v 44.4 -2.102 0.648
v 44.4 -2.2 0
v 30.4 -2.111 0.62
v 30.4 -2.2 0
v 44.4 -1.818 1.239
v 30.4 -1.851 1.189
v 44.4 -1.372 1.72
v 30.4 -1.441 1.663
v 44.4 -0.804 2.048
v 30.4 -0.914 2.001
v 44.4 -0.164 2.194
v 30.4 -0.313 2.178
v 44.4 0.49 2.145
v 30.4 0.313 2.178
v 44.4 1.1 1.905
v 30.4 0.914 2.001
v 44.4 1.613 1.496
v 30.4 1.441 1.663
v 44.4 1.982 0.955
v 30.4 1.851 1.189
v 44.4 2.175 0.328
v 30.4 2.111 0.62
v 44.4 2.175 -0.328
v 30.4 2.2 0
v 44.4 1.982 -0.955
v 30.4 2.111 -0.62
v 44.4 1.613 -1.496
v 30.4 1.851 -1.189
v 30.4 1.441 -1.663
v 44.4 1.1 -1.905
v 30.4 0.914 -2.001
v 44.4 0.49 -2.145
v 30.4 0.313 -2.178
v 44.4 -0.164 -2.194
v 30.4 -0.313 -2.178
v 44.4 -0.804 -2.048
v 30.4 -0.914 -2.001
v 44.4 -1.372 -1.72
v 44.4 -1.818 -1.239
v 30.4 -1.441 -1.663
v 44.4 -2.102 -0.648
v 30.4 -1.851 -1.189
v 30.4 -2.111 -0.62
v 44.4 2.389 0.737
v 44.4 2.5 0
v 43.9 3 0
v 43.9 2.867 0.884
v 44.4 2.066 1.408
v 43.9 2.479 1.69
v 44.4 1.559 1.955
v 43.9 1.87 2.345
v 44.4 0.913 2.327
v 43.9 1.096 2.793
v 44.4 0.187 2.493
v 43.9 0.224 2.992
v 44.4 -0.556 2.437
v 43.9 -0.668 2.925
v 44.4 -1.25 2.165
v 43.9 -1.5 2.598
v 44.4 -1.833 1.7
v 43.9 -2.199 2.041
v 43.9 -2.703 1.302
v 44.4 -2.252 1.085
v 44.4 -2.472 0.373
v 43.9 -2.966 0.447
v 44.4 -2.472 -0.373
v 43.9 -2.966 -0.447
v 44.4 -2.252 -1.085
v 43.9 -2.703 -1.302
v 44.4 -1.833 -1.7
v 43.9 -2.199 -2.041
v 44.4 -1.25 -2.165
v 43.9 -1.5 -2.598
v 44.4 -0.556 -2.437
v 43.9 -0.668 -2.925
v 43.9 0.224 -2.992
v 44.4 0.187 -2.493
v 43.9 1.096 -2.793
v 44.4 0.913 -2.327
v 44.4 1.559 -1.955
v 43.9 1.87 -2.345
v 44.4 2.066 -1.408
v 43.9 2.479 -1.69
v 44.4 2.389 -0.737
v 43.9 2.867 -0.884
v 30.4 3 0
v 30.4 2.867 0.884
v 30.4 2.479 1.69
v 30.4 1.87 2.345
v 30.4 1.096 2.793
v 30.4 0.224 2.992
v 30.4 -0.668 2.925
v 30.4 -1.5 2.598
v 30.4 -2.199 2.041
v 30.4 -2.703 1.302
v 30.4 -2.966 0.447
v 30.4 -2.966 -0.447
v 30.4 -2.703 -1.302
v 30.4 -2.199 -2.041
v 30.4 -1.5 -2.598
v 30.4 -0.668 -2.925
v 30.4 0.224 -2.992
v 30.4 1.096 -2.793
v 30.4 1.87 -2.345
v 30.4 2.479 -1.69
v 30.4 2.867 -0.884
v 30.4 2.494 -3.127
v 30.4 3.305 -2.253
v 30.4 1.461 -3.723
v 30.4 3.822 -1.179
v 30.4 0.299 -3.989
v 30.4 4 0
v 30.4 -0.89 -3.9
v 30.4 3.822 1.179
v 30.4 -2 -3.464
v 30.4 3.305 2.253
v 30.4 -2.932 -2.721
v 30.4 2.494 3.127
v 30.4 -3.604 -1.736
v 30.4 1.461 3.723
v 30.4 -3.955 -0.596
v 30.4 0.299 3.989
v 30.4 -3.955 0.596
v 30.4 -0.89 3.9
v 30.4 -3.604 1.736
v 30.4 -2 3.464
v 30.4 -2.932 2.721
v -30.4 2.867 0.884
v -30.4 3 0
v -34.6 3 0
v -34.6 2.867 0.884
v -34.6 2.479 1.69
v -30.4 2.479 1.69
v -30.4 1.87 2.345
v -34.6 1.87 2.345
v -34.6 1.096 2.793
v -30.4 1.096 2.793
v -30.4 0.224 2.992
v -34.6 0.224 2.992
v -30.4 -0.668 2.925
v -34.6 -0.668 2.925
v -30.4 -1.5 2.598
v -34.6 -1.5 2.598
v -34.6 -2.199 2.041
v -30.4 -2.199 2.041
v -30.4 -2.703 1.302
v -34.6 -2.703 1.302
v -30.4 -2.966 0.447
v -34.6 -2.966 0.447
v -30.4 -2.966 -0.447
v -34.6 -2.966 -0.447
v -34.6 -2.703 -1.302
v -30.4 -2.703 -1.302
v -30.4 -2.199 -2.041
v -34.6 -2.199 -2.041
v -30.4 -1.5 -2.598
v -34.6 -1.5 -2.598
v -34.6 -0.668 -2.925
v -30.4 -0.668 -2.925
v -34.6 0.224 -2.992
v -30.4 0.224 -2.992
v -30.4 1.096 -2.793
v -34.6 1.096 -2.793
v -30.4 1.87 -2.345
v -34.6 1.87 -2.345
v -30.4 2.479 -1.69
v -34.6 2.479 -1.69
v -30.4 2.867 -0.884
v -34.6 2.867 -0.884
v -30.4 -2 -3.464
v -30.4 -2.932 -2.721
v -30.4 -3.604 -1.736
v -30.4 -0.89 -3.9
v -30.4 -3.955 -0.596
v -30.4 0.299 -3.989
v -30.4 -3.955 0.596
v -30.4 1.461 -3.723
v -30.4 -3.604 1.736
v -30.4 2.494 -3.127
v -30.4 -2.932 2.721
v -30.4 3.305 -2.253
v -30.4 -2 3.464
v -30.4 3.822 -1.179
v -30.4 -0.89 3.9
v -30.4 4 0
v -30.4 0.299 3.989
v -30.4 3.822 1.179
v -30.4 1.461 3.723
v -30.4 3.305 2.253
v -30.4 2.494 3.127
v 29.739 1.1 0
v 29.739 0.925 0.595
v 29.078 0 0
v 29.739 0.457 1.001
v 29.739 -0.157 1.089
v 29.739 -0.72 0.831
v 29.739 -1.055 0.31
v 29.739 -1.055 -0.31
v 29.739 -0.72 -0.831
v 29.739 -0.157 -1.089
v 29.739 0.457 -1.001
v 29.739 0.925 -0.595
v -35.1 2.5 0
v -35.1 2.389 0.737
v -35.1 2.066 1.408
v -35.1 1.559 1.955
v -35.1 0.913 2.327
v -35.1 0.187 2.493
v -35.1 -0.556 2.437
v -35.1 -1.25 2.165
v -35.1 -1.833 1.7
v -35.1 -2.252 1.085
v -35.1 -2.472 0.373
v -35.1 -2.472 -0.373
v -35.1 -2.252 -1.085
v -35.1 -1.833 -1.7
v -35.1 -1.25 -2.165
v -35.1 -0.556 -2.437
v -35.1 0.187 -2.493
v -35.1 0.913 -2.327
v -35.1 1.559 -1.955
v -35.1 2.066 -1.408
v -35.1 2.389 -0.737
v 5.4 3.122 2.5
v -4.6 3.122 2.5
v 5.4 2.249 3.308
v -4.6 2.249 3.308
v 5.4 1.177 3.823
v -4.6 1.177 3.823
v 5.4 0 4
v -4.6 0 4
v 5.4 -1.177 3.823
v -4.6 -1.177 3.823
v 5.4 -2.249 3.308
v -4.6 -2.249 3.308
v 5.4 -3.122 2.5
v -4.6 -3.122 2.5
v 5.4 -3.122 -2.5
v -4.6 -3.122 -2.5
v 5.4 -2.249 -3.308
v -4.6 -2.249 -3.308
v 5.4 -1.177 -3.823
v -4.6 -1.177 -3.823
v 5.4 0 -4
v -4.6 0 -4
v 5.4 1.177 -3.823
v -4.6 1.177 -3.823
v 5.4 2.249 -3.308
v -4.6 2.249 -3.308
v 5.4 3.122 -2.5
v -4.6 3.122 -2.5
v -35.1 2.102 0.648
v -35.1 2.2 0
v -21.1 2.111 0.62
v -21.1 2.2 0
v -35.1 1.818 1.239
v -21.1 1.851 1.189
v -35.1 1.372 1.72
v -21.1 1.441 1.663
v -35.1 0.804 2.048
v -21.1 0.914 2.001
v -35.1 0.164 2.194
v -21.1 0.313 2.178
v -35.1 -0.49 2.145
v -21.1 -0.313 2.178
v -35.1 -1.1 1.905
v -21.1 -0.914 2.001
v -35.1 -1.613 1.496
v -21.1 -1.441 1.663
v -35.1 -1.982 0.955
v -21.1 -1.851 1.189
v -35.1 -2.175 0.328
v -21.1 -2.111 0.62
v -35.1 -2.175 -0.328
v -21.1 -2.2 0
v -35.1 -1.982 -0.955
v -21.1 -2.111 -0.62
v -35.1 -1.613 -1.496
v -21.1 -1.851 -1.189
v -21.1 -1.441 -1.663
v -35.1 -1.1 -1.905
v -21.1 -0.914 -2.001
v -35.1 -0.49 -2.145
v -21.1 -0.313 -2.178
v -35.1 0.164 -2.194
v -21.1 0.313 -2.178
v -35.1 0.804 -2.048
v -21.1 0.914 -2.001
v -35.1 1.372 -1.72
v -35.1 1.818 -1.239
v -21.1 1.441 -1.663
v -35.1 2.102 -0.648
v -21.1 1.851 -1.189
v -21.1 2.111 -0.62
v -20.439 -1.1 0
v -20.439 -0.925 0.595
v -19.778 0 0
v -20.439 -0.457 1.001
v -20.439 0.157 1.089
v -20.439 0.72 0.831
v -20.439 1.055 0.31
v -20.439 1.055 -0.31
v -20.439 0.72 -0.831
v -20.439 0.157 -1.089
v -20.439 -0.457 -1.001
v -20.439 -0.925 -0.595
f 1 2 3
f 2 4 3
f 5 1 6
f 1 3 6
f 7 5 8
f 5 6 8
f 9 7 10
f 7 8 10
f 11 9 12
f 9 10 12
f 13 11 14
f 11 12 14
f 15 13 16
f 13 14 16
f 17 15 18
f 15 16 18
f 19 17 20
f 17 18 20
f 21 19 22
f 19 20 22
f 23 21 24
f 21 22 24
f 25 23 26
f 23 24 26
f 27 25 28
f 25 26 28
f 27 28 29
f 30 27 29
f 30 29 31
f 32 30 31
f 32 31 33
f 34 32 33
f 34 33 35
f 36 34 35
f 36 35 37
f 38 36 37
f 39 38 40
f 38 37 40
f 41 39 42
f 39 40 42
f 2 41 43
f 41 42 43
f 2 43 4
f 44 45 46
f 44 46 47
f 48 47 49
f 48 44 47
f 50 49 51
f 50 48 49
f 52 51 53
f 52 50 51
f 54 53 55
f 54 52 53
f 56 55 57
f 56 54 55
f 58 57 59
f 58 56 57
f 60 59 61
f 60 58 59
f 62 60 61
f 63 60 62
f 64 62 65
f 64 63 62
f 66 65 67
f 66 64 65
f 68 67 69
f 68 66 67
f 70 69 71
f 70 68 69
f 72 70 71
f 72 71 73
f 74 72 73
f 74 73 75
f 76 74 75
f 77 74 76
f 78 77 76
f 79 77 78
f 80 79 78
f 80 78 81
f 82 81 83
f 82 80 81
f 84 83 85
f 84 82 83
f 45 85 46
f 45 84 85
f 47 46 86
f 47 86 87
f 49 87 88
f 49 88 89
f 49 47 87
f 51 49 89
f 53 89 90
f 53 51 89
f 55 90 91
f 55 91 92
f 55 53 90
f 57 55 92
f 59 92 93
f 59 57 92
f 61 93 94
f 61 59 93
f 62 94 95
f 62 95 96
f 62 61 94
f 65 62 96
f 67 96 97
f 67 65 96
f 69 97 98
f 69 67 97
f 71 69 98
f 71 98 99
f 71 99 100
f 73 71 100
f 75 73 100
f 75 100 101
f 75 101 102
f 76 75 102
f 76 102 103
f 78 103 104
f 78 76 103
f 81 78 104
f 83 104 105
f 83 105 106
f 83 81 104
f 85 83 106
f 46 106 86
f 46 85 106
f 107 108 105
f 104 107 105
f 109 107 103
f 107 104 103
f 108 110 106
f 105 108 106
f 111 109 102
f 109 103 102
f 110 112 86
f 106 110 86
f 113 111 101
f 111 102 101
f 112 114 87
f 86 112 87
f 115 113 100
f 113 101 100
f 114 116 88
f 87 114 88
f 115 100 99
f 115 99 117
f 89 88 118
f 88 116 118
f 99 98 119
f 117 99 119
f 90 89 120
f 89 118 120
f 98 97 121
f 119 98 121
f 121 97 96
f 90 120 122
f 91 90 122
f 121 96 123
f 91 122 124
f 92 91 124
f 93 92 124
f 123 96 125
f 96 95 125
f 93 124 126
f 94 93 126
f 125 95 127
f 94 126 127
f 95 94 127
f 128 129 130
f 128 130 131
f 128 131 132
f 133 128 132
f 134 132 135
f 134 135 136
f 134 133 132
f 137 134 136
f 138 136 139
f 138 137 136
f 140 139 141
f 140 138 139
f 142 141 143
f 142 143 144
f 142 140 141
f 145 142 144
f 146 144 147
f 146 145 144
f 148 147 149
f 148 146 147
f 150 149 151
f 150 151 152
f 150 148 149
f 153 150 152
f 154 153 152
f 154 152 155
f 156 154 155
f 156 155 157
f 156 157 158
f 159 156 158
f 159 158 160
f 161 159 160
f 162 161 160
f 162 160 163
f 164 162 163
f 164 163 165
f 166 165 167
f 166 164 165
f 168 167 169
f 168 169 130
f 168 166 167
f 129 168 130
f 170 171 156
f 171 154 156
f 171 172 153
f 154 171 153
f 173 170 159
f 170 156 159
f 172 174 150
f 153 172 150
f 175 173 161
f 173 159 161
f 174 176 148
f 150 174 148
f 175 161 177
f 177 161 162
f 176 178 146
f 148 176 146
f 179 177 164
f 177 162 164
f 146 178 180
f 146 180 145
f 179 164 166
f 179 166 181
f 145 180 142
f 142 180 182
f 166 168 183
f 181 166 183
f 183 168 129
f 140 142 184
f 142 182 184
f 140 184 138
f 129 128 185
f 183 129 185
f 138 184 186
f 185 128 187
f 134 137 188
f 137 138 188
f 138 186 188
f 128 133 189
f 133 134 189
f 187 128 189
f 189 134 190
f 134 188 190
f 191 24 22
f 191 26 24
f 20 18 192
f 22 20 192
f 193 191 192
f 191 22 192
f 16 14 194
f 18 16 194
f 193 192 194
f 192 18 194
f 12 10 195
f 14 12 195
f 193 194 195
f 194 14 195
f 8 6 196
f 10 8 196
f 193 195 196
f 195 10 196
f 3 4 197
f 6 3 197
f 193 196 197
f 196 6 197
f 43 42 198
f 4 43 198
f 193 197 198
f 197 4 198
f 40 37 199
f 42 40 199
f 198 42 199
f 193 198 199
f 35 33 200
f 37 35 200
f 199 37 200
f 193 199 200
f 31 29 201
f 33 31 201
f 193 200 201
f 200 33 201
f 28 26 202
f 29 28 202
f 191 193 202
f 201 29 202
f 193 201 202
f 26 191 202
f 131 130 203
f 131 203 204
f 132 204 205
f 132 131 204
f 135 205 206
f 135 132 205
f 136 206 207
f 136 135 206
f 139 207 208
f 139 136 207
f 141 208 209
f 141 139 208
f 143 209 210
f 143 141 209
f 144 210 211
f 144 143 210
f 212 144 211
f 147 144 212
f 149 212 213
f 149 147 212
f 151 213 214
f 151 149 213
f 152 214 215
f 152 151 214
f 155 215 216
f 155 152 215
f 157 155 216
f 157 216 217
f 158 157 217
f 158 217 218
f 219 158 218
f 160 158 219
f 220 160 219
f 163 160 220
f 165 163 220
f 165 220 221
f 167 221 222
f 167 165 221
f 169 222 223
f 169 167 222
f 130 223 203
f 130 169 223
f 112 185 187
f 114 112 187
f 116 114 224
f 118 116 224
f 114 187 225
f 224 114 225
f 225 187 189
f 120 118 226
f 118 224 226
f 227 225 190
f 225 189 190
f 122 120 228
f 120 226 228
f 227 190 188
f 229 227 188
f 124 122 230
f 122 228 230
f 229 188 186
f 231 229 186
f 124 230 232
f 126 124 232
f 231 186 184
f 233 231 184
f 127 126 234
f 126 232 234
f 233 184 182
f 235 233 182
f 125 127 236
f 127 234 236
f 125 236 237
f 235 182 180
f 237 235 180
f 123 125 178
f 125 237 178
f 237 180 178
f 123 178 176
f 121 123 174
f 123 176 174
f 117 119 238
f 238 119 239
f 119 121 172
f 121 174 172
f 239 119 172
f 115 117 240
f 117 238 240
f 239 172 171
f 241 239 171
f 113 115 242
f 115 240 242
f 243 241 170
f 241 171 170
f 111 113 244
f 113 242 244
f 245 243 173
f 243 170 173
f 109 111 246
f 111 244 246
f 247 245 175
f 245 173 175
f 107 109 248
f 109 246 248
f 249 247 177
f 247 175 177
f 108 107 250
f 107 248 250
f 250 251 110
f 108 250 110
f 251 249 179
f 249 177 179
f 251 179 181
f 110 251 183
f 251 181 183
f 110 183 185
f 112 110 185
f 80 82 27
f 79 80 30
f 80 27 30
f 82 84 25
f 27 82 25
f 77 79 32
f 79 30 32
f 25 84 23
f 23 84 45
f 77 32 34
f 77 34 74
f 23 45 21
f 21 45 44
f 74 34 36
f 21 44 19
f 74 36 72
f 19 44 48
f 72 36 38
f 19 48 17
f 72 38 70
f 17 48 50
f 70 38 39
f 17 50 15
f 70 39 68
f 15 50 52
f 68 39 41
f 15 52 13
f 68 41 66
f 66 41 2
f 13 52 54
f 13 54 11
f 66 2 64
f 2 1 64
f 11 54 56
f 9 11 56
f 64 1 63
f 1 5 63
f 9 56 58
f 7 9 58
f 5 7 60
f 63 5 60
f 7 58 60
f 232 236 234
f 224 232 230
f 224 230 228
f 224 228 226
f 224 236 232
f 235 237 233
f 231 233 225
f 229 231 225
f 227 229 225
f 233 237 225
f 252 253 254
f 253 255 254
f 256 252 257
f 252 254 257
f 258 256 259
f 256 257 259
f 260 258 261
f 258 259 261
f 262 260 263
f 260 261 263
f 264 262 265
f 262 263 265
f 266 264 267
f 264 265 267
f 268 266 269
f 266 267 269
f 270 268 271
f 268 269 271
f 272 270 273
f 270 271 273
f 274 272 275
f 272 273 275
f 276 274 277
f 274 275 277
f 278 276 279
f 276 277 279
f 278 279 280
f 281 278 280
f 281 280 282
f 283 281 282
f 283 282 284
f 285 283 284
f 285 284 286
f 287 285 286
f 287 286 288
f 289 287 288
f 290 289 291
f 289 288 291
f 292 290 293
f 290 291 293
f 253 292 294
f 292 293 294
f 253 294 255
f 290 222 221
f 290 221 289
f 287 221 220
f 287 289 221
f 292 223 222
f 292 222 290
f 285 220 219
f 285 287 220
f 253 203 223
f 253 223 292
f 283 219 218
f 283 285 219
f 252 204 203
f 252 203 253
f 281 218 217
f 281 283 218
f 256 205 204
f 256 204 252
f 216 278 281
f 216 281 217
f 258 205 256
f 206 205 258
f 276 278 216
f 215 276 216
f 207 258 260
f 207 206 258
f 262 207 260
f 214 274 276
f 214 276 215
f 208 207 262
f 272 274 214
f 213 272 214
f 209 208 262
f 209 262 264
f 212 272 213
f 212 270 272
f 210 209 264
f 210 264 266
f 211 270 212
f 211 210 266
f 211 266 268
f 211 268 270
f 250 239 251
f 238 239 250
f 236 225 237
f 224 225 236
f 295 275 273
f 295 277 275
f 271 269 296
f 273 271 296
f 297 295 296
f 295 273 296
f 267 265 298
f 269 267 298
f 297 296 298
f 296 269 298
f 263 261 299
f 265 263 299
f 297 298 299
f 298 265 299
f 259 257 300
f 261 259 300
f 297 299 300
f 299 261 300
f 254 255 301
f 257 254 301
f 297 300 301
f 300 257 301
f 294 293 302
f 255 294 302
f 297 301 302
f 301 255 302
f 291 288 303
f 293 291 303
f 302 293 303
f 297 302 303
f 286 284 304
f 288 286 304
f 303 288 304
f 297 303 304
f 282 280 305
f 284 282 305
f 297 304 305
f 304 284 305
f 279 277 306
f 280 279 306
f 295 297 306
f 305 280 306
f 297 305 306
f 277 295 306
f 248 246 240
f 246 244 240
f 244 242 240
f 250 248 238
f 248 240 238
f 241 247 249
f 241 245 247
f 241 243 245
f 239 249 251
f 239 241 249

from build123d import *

# Parameters (mm, degrees)
F0_W     = 4.7
F0_H     = 3
F0_W_2   = 14
F2_W     = 10
F2_H     = 4.175300472
F3_DEPTH = 12.5
F5_D     = 4.4
F5_DEPTH = 14
F5_TIP   = 1.3218933619
F7_D     = 4.4
F7_DEPTH = 14
F7_TIP   = 1.3218933619
F8_SIZE  = 0.5


with BuildPart() as f1:
    # F0 (on Top) → F1 (revolve)
    with BuildSketch(Plane.XY):
        with Locations((-32.75, 1.5)):
            Rectangle(F0_W, F0_H)
        Polygon((30.4, 3), (30.4, 4), (-30.4, 4), (-30.4, 3), (-30.4, 0), (30.4, 0), align=None)
        with Locations((37.4, 1.5)):
            Rectangle(F0_W_2, F0_H)
    revolve(axis=Axis((3.1452495605, 0, 0), (1, 0, 0)))

    # F2 (on Front) → F3 (cut, symmetric)
    with BuildSketch(Plane.XZ):
        with Locations((0.4, 4.587650236)):
            Rectangle(F2_W, F2_H)
        with Locations((0.4, -4.587650236)):
            Rectangle(F2_W, F2_H)
    extrude(amount=F3_DEPTH, both=True, mode=Mode.SUBTRACT)

    # F5
    with Locations(Plane.YZ.offset(44.4)):
        with Locations((0, 0)):
            Hole(F5_D / 2, depth=F5_DEPTH)
            with Locations((0, 0, -(F5_DEPTH + F5_TIP / 2))):  # 118° drill point
                Cone(0, F5_D / 2, F5_TIP, mode=Mode.SUBTRACT)

    # F7
    with Locations(Plane(origin=(-35.1, 0, 0), x_dir=(0, -1, 0), z_dir=(-1, 0, 0))):
        with Locations((0, 0)):
            Hole(F7_D / 2, depth=F7_DEPTH)
            with Locations((0, 0, -(F7_DEPTH + F7_TIP / 2))):  # 118° drill point
                Cone(0, F7_D / 2, F7_TIP, mode=Mode.SUBTRACT)

    # F8
    f8_edges = [f1.edges().sort_by_distance(p)[0] for p in [
        (-35.1, -3, 0),
        (44.4, -3, 0),
    ]]
    chamfer(f8_edges, length=F8_SIZE)


solid = f1.part
